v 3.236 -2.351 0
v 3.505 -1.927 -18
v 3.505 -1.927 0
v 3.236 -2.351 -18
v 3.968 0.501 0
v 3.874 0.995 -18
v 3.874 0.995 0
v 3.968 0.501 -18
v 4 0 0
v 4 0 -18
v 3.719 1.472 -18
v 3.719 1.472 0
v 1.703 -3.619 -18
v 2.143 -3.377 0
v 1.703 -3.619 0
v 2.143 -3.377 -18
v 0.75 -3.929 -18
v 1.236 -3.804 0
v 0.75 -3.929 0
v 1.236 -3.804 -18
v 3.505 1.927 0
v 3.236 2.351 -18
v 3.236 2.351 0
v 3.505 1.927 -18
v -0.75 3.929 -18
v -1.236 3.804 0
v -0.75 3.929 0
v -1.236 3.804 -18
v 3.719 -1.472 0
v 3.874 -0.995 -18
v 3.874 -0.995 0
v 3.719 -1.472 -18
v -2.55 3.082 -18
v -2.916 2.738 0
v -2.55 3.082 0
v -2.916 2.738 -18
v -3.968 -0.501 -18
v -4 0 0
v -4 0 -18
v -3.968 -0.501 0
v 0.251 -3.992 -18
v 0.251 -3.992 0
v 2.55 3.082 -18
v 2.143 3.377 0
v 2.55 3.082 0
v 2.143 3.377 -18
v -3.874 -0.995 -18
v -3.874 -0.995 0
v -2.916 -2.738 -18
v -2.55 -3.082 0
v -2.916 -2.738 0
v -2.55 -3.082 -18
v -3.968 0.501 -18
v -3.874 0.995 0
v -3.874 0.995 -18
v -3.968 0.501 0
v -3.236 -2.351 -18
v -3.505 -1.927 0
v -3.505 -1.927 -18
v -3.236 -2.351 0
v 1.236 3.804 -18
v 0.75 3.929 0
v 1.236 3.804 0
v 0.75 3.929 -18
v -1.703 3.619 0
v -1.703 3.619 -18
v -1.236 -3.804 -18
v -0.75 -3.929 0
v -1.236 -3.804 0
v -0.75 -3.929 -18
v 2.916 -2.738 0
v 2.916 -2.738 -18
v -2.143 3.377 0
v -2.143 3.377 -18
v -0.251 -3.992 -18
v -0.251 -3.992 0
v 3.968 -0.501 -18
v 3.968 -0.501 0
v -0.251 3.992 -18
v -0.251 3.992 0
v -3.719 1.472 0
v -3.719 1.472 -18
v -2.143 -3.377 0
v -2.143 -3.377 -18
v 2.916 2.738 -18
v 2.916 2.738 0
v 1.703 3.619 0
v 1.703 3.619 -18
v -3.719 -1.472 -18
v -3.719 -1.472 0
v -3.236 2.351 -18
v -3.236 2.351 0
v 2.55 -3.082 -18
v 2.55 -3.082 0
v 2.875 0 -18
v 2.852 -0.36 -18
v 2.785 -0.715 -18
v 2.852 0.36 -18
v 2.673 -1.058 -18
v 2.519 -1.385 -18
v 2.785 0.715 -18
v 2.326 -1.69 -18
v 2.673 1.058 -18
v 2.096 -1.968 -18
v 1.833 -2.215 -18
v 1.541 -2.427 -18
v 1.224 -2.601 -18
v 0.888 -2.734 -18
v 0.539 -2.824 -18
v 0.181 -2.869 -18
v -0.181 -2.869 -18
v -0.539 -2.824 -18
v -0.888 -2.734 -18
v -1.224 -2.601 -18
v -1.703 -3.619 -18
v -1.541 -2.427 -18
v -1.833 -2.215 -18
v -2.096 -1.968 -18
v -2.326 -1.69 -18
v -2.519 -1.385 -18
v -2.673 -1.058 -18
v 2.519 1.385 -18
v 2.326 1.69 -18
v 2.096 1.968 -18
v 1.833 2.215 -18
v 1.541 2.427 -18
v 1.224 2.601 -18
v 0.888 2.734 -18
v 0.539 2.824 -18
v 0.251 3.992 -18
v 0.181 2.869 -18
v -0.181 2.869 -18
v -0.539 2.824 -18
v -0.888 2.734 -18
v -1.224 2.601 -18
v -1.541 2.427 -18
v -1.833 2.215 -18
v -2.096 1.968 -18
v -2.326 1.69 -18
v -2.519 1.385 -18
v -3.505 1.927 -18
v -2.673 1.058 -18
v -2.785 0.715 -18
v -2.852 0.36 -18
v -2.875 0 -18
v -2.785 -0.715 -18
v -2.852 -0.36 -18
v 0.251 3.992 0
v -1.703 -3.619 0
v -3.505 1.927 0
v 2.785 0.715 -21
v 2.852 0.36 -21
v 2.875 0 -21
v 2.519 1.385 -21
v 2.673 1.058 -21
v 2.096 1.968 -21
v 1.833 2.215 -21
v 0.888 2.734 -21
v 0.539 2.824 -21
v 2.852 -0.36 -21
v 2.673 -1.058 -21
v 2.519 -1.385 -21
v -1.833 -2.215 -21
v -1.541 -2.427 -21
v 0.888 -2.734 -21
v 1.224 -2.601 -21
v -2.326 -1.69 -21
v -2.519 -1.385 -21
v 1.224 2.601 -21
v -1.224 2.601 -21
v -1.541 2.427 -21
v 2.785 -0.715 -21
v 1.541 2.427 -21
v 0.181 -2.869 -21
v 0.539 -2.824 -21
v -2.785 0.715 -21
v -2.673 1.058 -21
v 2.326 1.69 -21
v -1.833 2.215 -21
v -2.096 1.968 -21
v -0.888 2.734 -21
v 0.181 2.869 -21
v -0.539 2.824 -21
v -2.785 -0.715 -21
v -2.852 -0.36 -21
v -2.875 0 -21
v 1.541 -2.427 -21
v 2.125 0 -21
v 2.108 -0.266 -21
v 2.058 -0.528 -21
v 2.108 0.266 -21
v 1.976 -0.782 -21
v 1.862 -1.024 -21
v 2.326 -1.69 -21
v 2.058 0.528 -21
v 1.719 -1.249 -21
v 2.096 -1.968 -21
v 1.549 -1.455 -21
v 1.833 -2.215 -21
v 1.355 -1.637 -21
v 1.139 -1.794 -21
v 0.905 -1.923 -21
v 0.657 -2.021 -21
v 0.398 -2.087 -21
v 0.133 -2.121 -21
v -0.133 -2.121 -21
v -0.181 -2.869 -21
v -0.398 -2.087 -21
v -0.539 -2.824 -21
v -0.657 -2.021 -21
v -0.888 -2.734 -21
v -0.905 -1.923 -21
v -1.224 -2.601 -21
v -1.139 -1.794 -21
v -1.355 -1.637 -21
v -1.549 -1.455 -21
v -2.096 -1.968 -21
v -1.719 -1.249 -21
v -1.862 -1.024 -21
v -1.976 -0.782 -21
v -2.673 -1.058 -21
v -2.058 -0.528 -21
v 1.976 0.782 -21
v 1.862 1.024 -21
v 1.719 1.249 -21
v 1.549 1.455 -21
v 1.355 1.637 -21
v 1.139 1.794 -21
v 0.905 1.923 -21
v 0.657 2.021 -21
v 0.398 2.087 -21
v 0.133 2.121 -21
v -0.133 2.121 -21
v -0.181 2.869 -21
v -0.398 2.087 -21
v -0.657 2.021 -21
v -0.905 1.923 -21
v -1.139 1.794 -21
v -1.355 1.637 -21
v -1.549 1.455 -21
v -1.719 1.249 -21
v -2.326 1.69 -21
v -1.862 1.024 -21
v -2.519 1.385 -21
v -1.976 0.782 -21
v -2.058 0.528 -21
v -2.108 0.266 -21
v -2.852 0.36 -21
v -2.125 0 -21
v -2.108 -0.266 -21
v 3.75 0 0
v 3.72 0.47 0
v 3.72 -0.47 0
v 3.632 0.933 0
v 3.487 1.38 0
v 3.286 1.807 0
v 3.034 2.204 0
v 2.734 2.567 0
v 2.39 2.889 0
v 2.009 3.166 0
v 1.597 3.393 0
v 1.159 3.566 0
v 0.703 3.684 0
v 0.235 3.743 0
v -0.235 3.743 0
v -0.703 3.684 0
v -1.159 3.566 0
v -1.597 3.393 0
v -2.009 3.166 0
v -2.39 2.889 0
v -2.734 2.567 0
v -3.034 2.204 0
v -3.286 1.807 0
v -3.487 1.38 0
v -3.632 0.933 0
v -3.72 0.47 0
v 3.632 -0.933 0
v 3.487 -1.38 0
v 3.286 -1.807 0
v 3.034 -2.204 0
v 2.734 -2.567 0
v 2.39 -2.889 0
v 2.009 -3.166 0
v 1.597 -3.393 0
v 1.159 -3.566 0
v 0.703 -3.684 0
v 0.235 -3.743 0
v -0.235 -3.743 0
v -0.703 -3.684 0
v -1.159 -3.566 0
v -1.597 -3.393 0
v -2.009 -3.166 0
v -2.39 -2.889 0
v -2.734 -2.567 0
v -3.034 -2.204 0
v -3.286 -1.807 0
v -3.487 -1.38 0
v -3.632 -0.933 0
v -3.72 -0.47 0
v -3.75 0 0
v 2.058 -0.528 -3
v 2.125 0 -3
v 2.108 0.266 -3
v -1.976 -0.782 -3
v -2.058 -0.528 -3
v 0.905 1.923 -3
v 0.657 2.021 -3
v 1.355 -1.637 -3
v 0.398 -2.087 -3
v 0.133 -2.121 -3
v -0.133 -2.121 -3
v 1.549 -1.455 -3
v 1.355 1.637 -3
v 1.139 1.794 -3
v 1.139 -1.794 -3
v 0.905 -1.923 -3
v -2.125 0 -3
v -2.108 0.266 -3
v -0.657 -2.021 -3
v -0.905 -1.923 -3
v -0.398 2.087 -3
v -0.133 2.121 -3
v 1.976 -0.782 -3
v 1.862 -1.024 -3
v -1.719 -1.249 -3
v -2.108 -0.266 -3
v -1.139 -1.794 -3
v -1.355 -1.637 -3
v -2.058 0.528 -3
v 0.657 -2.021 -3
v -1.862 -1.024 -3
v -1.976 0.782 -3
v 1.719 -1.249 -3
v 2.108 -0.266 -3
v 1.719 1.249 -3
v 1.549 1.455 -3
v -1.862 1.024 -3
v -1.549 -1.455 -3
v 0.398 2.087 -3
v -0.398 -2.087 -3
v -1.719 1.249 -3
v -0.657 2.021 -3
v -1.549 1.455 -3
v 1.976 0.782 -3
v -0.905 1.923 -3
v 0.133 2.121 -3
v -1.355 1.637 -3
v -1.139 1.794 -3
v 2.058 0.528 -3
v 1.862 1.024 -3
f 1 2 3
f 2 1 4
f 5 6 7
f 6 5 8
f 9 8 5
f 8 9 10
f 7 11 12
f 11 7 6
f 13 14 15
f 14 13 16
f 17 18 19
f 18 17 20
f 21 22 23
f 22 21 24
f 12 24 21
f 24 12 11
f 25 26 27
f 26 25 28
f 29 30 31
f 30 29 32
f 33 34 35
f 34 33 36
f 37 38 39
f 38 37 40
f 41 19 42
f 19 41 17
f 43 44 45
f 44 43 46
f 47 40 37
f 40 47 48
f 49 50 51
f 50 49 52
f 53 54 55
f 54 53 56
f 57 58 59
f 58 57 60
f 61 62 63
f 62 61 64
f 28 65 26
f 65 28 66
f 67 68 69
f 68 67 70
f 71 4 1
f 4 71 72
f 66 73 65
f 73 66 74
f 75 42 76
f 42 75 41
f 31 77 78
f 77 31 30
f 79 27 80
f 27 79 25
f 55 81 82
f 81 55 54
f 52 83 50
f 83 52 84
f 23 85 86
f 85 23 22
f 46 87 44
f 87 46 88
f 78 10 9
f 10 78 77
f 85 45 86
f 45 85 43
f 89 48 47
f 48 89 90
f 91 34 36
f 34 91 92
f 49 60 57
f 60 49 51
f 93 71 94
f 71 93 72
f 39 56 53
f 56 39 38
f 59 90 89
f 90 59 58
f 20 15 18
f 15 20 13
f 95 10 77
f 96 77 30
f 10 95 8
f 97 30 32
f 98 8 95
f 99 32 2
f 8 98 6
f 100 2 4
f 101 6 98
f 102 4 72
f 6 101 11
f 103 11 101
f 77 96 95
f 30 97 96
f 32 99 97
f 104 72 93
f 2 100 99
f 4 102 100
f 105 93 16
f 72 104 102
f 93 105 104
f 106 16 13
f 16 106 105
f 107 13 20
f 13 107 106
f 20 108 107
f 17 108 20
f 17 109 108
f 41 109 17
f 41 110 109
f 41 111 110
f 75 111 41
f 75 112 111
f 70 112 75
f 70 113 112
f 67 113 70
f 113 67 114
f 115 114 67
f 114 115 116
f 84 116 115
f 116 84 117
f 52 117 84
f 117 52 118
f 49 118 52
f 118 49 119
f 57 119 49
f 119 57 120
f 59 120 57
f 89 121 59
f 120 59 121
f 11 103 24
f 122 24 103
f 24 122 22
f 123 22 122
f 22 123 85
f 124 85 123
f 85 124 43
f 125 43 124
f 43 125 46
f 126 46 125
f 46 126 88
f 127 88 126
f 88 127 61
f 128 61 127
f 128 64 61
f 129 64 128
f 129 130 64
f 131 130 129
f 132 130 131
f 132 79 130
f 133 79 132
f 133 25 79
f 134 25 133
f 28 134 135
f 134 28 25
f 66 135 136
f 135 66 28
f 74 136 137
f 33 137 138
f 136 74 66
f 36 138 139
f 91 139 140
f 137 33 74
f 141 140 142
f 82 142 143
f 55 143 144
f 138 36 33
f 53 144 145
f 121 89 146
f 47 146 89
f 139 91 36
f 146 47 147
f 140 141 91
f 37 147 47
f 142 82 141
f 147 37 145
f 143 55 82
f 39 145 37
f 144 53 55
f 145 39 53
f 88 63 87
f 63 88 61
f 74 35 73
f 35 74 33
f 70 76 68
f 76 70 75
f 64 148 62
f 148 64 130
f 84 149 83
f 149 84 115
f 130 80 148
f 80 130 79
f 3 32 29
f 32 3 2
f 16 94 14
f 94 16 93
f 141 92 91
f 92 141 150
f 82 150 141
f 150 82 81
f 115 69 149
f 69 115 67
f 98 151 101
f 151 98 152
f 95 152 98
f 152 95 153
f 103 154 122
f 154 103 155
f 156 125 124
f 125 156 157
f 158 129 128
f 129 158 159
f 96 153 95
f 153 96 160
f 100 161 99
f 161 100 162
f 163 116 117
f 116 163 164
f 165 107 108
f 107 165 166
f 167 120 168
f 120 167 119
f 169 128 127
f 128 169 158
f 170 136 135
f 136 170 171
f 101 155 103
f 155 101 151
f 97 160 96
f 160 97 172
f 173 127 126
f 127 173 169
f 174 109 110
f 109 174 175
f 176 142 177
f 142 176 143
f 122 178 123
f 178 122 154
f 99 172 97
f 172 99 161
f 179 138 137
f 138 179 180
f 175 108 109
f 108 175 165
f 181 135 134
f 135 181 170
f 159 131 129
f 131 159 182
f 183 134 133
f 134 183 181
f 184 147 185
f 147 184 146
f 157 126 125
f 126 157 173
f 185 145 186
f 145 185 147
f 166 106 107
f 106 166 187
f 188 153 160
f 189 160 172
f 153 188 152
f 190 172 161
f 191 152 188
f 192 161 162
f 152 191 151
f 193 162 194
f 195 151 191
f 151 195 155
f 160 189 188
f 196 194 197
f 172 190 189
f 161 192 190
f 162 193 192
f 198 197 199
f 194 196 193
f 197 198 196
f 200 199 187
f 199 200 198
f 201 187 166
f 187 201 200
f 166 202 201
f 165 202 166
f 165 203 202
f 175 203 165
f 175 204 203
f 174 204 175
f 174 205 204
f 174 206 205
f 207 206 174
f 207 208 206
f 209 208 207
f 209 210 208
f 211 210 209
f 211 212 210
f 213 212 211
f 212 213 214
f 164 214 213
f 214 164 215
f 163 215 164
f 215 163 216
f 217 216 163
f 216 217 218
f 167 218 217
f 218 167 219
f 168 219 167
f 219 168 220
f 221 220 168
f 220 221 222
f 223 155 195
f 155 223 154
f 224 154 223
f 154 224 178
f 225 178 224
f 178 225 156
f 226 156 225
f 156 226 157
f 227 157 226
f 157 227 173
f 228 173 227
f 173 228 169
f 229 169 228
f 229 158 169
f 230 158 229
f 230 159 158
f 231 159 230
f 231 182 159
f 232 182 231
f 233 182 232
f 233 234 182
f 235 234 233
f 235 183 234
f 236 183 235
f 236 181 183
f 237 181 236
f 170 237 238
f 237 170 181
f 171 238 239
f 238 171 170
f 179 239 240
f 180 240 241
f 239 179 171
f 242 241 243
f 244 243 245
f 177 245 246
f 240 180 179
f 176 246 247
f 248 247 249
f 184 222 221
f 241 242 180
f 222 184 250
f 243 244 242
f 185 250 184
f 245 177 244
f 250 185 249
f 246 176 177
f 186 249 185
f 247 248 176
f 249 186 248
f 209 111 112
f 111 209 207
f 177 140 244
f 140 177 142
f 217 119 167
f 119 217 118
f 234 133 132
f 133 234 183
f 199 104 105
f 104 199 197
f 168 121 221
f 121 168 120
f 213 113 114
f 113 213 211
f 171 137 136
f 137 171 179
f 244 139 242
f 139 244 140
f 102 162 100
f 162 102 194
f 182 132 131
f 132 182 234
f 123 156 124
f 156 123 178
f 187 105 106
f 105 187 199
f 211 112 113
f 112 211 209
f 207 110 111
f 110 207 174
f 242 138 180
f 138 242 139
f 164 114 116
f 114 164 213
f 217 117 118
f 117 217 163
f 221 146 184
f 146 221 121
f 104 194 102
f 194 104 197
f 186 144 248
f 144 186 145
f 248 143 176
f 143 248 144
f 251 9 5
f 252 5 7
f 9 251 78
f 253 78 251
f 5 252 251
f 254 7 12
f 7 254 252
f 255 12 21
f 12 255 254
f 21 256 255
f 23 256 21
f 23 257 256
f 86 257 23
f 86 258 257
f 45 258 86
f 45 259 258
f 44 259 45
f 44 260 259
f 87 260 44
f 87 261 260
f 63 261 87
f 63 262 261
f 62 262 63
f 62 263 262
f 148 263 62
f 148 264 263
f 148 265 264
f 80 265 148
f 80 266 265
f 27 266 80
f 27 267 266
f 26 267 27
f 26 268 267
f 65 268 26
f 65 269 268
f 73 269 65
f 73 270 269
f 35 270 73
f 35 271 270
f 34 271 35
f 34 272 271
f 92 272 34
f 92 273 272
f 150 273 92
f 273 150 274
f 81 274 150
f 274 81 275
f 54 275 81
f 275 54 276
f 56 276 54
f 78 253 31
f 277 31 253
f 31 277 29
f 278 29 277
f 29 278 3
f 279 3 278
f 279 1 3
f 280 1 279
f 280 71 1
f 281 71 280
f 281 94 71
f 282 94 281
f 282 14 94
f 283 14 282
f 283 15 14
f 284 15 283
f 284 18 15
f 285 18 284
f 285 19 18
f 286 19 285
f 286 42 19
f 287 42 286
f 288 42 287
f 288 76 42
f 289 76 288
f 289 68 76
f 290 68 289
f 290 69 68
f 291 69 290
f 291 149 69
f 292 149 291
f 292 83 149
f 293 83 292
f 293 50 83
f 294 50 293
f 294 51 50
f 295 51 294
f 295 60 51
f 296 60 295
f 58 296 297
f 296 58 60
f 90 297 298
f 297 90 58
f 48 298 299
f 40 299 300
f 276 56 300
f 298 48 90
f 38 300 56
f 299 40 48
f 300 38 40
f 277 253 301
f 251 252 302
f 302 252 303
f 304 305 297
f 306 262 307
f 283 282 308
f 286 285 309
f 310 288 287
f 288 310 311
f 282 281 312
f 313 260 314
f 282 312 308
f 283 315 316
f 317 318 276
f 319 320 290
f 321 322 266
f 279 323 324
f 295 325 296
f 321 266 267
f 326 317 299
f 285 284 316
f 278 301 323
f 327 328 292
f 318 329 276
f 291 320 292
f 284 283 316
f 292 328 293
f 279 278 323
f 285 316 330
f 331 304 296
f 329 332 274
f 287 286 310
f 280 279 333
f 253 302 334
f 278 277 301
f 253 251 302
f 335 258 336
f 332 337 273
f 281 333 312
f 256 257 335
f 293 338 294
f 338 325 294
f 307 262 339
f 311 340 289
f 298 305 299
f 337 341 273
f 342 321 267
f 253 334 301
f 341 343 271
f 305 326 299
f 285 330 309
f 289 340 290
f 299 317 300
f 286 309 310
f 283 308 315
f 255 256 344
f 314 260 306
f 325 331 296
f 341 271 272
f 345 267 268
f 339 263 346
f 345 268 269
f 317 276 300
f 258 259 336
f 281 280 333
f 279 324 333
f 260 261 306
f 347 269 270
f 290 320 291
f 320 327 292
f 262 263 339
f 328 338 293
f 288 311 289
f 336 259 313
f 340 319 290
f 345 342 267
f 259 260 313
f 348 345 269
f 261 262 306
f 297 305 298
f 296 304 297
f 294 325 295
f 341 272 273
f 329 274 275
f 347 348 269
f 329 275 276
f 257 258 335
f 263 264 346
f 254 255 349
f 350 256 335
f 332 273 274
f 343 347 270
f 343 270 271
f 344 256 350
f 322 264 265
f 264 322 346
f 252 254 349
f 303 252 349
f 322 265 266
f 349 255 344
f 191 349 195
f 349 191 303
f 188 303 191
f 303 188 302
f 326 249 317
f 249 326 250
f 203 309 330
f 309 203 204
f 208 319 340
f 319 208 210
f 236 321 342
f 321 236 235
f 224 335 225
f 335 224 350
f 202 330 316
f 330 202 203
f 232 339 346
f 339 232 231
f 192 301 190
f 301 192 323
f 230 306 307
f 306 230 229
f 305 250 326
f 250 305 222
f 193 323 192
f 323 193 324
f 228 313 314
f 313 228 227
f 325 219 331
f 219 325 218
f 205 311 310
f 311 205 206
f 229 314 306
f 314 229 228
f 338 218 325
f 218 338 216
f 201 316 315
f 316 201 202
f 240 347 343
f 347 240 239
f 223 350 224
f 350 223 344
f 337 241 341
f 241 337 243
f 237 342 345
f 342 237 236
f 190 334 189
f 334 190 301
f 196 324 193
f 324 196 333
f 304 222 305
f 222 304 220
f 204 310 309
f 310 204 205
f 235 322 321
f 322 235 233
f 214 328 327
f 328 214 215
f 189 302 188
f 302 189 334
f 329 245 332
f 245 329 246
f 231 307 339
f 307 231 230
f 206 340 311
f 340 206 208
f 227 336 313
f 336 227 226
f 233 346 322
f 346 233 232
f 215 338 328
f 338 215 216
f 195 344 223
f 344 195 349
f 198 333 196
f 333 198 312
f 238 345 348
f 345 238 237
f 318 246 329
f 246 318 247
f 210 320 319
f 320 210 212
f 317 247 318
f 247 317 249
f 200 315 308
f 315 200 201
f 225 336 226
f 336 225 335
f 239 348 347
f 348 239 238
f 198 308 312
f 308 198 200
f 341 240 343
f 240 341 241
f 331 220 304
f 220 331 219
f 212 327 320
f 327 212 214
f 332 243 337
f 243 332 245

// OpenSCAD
$fn = 50;

difference() {
	union() {
		translate(v = [0, 0, -18.0]) {
			cylinder(h = 21, r = 4.0);
		}
		#translate(v = [0, 0, -21.0]) {
			cylinder(h = 21, r = 2.875);
		}
	}
	union() {
		translate(v = [0, 0, 0]) {
			rotate(a = [0, 0, 0]) {
				difference() {
					union() {
						translate(v = [0, 0, -21.0]) {
							cylinder(h = 21, r = 2.0);
						}
						translate(v = [0, 0, -3]) {
							cylinder(h = 3, r1 = 2.125, r2 = 3.75);
						}
						translate(v = [0, 0, -21.0]) {
							cylinder(h = 21, r = 2.125);
						}
						translate(v = [0, 0, -21.0]) {
							cylinder(h = 21, r = 2.0);
						}
					}
					union();
				}
			}
		}
		#cylinder(h = 3, r = 5.0);
	}
}
